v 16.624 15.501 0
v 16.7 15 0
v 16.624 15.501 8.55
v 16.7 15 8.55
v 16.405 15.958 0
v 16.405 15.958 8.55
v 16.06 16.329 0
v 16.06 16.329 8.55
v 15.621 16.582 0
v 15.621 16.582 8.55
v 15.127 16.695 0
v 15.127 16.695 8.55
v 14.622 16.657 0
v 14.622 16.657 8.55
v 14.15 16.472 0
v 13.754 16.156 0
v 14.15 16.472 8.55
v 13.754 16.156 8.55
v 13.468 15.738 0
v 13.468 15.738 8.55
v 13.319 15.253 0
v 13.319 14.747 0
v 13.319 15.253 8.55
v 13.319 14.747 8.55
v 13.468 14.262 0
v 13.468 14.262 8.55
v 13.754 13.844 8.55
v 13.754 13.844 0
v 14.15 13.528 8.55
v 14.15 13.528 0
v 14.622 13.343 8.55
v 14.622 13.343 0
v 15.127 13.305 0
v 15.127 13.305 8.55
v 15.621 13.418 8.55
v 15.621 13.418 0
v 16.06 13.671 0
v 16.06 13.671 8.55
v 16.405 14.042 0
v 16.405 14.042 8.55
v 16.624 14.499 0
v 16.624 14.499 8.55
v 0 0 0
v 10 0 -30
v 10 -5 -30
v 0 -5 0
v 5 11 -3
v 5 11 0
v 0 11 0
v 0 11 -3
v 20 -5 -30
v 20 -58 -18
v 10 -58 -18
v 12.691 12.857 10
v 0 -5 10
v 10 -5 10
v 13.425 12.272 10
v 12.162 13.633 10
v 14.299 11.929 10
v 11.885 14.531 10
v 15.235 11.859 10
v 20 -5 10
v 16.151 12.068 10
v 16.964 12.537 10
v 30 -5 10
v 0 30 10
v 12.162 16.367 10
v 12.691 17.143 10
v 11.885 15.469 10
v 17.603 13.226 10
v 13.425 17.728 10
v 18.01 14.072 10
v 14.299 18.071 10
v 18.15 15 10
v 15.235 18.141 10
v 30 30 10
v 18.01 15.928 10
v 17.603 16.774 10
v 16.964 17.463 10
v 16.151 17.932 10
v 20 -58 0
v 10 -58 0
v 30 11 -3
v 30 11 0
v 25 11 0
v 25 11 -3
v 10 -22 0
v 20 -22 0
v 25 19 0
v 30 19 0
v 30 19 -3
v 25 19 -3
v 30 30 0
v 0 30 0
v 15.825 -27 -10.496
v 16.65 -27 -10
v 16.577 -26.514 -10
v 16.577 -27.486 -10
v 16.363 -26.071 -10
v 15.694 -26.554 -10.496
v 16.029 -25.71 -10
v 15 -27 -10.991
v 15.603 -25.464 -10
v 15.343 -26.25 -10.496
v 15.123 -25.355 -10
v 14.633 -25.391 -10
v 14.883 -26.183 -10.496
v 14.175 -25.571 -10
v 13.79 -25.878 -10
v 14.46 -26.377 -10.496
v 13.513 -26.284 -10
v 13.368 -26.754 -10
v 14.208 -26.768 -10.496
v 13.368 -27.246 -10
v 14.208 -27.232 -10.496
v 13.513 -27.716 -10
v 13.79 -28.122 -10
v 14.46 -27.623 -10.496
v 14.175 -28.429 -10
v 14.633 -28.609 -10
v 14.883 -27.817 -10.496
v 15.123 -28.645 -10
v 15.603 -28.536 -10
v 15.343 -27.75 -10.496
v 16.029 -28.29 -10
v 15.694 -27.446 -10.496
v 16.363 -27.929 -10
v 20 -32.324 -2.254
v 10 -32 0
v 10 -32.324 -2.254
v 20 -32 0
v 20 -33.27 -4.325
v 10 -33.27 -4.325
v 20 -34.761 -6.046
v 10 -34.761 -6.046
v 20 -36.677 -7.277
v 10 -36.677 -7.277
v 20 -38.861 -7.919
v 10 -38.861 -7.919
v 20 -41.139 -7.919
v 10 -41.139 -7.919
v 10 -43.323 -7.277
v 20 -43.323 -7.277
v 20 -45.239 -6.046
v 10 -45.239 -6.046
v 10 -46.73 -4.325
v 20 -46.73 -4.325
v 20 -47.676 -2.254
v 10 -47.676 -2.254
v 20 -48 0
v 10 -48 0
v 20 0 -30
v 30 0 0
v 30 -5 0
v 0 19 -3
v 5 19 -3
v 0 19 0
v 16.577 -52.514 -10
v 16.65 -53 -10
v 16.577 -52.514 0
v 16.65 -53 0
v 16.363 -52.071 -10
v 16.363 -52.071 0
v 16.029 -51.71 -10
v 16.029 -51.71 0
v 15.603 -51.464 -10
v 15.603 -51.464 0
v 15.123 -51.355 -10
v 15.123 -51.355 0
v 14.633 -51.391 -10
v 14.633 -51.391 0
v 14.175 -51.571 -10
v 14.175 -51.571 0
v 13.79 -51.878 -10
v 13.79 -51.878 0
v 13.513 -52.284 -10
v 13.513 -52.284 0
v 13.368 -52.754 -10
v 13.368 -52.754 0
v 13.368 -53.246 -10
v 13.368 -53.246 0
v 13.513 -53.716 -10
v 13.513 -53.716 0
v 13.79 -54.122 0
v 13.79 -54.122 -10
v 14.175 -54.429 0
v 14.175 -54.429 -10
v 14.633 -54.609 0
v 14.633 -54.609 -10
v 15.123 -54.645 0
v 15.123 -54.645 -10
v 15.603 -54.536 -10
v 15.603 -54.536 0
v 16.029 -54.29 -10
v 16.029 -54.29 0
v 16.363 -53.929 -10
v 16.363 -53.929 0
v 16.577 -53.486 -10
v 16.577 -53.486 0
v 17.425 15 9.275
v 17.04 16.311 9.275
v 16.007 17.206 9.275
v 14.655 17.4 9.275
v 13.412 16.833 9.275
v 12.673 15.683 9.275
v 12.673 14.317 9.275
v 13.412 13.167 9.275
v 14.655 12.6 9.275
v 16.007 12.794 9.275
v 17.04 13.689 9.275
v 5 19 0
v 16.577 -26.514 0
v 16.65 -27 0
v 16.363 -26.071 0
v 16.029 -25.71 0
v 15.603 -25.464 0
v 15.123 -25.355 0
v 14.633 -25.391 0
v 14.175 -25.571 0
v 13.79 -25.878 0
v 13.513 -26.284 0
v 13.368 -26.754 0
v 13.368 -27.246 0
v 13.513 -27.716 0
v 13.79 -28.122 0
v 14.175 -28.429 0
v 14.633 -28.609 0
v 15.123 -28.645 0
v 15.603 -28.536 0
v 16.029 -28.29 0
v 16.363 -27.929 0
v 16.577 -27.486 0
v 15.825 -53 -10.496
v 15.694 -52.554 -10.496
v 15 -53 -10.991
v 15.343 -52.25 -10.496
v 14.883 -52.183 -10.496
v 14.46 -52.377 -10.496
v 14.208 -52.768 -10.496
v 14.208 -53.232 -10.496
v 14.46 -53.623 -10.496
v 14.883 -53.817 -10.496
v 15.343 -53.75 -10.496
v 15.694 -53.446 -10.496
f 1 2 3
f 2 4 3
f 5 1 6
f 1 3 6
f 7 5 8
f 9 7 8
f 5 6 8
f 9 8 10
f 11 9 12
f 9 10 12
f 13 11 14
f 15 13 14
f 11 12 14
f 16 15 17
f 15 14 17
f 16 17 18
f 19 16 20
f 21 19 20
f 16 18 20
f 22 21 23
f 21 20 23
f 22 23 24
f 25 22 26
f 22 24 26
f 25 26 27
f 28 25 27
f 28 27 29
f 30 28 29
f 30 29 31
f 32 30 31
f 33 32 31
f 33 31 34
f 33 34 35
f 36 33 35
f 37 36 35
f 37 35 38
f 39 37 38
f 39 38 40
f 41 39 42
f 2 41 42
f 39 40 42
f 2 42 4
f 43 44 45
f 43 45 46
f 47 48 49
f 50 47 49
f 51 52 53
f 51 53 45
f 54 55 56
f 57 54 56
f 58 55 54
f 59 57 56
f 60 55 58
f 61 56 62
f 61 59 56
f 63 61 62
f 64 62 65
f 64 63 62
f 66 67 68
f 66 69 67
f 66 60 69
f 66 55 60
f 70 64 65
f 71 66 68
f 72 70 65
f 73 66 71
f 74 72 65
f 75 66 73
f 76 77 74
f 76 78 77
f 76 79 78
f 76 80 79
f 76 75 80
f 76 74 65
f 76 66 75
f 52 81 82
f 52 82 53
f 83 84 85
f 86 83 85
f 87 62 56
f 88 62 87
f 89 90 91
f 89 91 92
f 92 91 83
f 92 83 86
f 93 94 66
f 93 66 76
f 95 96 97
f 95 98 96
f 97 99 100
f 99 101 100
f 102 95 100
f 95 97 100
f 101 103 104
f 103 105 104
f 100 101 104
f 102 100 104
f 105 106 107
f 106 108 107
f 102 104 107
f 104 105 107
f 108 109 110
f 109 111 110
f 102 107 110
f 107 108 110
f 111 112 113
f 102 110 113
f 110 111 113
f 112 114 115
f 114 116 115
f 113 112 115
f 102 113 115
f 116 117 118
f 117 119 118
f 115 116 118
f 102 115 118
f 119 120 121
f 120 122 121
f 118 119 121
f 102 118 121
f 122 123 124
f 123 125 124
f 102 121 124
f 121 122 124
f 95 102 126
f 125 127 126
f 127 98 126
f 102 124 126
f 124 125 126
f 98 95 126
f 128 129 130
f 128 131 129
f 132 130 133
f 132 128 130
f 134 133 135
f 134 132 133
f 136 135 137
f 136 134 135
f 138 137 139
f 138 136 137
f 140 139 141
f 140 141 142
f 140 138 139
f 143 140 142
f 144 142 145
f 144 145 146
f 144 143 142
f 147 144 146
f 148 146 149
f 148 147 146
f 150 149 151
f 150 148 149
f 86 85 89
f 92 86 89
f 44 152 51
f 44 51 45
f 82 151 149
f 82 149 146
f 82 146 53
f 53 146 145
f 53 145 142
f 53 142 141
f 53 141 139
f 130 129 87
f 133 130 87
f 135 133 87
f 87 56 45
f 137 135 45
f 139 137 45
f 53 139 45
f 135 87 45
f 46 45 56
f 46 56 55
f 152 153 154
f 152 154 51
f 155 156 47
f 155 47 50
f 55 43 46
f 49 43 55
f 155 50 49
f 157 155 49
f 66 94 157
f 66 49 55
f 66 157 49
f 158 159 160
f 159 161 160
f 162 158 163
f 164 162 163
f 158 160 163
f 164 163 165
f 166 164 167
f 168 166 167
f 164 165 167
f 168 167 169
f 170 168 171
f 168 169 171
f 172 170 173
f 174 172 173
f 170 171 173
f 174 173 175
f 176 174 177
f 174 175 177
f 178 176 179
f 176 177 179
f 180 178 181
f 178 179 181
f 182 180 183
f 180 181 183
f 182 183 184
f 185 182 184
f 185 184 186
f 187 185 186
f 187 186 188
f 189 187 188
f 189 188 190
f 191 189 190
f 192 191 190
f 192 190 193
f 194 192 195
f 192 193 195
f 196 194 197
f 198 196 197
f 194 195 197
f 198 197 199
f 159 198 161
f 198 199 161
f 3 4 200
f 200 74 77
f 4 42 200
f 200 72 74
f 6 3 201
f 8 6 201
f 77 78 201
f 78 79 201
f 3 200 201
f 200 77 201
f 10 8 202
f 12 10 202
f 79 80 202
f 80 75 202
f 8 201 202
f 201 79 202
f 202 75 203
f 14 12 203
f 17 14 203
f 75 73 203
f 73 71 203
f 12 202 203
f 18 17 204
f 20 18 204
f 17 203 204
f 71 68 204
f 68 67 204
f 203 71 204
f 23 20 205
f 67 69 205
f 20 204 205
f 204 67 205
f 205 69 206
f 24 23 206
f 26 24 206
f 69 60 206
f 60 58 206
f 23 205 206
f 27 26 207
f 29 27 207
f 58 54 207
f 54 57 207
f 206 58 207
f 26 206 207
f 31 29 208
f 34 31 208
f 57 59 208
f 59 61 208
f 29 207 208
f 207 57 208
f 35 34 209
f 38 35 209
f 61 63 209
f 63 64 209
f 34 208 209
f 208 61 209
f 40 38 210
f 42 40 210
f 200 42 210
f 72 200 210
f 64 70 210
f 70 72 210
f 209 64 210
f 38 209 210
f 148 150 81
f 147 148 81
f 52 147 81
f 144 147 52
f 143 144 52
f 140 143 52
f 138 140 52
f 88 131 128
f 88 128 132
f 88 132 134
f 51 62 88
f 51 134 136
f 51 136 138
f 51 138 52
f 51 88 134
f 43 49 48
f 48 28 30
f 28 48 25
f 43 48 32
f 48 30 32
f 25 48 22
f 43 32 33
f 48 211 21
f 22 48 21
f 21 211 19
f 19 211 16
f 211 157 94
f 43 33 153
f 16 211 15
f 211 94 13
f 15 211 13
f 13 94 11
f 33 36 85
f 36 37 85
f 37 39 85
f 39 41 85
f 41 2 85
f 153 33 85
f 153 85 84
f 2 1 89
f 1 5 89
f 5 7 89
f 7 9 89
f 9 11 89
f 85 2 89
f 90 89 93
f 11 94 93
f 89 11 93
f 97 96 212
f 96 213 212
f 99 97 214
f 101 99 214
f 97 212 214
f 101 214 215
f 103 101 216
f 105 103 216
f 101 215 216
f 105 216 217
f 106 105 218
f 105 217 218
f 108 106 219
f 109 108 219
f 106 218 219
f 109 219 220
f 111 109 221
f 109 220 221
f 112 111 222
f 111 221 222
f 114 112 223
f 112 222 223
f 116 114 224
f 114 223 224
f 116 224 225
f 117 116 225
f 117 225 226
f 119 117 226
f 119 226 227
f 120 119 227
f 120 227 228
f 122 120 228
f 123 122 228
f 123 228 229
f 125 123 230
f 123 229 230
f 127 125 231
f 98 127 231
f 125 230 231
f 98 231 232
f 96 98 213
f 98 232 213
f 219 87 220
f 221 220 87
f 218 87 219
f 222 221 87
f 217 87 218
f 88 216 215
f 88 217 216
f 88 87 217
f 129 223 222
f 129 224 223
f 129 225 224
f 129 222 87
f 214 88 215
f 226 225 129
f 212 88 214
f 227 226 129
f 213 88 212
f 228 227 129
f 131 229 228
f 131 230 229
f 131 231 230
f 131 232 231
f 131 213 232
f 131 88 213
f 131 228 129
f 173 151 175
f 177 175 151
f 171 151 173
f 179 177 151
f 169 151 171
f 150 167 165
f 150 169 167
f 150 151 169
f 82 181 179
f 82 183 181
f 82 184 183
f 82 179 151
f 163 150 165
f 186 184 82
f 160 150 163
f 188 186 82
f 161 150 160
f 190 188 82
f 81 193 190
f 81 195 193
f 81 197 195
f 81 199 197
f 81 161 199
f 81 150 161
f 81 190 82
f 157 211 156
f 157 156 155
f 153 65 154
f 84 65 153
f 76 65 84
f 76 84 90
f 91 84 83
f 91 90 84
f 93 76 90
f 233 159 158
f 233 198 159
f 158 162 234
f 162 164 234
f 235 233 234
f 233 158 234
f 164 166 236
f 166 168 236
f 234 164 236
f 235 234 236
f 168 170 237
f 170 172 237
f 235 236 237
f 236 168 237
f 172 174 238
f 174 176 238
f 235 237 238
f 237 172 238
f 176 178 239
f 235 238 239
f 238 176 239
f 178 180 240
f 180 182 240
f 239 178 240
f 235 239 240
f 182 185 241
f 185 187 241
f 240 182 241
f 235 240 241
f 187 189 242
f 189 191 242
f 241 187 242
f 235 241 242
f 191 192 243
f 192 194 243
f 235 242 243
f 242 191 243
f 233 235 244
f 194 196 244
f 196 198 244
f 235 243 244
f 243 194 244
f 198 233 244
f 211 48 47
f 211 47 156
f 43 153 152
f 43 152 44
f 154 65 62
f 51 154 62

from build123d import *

# Parameters (mm, degrees)
SKETCH_1_W      = 30
SKETCH_1_H      = 30
EXTRUDE_1_DEPTH = 10
EXTRUDE_2_DEPTH = 5
EXTRUDE_3_DEPTH = 5
SKETCH_6_W      = 5
SKETCH_6_H      = 8
EXTRUDE_4_DEPTH = 3


# Read off the part's stored shape, not the designer's step: 高级异型孔1, 高级异型孔2
with BuildPart() as part:
    # 草图1 → 凸台-拉伸1 (new body)
    with BuildSketch(Plane.XY):
        with Locations((15, 15)):
            Rectangle(SKETCH_1_W, SKETCH_1_H)
    extrude(amount=EXTRUDE_1_DEPTH)

    # 草图2 → 凸台-拉伸2 (add)
    with BuildSketch(Plane.XZ):
        Polygon((0, 10), (30, 10), (30, 0), (20, -30), (10, -30), (0, 0), align=None)
    extrude(amount=EXTRUDE_2_DEPTH)

    # 草图3 → 凸台-拉伸3 (add, symmetric)
    with BuildSketch(Plane(origin=(15, 0, 0), x_dir=(0, 0, -1), z_dir=(1, 0, 0))):
        with BuildLine():
            Line((0, -48), (0, -58))
            Line((0, -58), (18, -58))
            Line((18, -58), (30, -5))
            Line((30, -5), (-10, -5))
            Line((-10, -5), (0, -22))
            Line((0, -22), (0, -32))
            ThreePointArc((0, -32), (8, -40), (0, -48))
        make_face()
    extrude(amount=EXTRUDE_3_DEPTH, both=True)

    # 草图6 → 凸台-拉伸4 (add)
    with BuildSketch(Plane(origin=(0, 0, 0), x_dir=(-1, 0, 0), z_dir=(0, 0, -1))):
        with Locations((-27.5, 15)):
            Rectangle(SKETCH_6_W, SKETCH_6_H)
        with Locations((-2.5, 15)):
            Rectangle(SKETCH_6_W, SKETCH_6_H)
    extrude(amount=EXTRUDE_4_DEPTH)

    # 高级异型孔1 outline → 高级异型孔1 (revolve, cut)
    with BuildSketch(Plane(origin=(15, 15, 0), x_dir=(1, 0, 0), z_dir=(0, -1, 0))):
        Polygon((3.15, 10), (0, 10), (0, 0), (1.7, 0), (1.7, 8.55), align=None)
    revolve(axis=Axis((15, 15, 0), (0, 0, 1)), mode=Mode.SUBTRACT)

    # 高级异型孔2 outline → 高级异型孔2 (revolve, cut)
    with BuildSketch(Plane(origin=(15, -53, 0), x_dir=(1, 0, 0), z_dir=(0, -1, 0))):
        Polygon((0, -10.991420021), (1.65, -10), (1.65, 0), (0, 0), align=None)
    revolve(axis=Axis((15, -53, 0), (0, 0, 1)), mode=Mode.SUBTRACT)

    # Other 2 2 outline → Other 2 2 (revolve, cut)
    with BuildSketch(Plane(origin=(15, -27, 0), x_dir=(1, 0, 0), z_dir=(0, -1, 0))):
        Polygon((0, -10.991420021), (1.65, -10), (1.65, 0), (0, 0), align=None)
    revolve(axis=Axis((15, -27, 0), (0, 0, 1)), mode=Mode.SUBTRACT)


solid = part.part
